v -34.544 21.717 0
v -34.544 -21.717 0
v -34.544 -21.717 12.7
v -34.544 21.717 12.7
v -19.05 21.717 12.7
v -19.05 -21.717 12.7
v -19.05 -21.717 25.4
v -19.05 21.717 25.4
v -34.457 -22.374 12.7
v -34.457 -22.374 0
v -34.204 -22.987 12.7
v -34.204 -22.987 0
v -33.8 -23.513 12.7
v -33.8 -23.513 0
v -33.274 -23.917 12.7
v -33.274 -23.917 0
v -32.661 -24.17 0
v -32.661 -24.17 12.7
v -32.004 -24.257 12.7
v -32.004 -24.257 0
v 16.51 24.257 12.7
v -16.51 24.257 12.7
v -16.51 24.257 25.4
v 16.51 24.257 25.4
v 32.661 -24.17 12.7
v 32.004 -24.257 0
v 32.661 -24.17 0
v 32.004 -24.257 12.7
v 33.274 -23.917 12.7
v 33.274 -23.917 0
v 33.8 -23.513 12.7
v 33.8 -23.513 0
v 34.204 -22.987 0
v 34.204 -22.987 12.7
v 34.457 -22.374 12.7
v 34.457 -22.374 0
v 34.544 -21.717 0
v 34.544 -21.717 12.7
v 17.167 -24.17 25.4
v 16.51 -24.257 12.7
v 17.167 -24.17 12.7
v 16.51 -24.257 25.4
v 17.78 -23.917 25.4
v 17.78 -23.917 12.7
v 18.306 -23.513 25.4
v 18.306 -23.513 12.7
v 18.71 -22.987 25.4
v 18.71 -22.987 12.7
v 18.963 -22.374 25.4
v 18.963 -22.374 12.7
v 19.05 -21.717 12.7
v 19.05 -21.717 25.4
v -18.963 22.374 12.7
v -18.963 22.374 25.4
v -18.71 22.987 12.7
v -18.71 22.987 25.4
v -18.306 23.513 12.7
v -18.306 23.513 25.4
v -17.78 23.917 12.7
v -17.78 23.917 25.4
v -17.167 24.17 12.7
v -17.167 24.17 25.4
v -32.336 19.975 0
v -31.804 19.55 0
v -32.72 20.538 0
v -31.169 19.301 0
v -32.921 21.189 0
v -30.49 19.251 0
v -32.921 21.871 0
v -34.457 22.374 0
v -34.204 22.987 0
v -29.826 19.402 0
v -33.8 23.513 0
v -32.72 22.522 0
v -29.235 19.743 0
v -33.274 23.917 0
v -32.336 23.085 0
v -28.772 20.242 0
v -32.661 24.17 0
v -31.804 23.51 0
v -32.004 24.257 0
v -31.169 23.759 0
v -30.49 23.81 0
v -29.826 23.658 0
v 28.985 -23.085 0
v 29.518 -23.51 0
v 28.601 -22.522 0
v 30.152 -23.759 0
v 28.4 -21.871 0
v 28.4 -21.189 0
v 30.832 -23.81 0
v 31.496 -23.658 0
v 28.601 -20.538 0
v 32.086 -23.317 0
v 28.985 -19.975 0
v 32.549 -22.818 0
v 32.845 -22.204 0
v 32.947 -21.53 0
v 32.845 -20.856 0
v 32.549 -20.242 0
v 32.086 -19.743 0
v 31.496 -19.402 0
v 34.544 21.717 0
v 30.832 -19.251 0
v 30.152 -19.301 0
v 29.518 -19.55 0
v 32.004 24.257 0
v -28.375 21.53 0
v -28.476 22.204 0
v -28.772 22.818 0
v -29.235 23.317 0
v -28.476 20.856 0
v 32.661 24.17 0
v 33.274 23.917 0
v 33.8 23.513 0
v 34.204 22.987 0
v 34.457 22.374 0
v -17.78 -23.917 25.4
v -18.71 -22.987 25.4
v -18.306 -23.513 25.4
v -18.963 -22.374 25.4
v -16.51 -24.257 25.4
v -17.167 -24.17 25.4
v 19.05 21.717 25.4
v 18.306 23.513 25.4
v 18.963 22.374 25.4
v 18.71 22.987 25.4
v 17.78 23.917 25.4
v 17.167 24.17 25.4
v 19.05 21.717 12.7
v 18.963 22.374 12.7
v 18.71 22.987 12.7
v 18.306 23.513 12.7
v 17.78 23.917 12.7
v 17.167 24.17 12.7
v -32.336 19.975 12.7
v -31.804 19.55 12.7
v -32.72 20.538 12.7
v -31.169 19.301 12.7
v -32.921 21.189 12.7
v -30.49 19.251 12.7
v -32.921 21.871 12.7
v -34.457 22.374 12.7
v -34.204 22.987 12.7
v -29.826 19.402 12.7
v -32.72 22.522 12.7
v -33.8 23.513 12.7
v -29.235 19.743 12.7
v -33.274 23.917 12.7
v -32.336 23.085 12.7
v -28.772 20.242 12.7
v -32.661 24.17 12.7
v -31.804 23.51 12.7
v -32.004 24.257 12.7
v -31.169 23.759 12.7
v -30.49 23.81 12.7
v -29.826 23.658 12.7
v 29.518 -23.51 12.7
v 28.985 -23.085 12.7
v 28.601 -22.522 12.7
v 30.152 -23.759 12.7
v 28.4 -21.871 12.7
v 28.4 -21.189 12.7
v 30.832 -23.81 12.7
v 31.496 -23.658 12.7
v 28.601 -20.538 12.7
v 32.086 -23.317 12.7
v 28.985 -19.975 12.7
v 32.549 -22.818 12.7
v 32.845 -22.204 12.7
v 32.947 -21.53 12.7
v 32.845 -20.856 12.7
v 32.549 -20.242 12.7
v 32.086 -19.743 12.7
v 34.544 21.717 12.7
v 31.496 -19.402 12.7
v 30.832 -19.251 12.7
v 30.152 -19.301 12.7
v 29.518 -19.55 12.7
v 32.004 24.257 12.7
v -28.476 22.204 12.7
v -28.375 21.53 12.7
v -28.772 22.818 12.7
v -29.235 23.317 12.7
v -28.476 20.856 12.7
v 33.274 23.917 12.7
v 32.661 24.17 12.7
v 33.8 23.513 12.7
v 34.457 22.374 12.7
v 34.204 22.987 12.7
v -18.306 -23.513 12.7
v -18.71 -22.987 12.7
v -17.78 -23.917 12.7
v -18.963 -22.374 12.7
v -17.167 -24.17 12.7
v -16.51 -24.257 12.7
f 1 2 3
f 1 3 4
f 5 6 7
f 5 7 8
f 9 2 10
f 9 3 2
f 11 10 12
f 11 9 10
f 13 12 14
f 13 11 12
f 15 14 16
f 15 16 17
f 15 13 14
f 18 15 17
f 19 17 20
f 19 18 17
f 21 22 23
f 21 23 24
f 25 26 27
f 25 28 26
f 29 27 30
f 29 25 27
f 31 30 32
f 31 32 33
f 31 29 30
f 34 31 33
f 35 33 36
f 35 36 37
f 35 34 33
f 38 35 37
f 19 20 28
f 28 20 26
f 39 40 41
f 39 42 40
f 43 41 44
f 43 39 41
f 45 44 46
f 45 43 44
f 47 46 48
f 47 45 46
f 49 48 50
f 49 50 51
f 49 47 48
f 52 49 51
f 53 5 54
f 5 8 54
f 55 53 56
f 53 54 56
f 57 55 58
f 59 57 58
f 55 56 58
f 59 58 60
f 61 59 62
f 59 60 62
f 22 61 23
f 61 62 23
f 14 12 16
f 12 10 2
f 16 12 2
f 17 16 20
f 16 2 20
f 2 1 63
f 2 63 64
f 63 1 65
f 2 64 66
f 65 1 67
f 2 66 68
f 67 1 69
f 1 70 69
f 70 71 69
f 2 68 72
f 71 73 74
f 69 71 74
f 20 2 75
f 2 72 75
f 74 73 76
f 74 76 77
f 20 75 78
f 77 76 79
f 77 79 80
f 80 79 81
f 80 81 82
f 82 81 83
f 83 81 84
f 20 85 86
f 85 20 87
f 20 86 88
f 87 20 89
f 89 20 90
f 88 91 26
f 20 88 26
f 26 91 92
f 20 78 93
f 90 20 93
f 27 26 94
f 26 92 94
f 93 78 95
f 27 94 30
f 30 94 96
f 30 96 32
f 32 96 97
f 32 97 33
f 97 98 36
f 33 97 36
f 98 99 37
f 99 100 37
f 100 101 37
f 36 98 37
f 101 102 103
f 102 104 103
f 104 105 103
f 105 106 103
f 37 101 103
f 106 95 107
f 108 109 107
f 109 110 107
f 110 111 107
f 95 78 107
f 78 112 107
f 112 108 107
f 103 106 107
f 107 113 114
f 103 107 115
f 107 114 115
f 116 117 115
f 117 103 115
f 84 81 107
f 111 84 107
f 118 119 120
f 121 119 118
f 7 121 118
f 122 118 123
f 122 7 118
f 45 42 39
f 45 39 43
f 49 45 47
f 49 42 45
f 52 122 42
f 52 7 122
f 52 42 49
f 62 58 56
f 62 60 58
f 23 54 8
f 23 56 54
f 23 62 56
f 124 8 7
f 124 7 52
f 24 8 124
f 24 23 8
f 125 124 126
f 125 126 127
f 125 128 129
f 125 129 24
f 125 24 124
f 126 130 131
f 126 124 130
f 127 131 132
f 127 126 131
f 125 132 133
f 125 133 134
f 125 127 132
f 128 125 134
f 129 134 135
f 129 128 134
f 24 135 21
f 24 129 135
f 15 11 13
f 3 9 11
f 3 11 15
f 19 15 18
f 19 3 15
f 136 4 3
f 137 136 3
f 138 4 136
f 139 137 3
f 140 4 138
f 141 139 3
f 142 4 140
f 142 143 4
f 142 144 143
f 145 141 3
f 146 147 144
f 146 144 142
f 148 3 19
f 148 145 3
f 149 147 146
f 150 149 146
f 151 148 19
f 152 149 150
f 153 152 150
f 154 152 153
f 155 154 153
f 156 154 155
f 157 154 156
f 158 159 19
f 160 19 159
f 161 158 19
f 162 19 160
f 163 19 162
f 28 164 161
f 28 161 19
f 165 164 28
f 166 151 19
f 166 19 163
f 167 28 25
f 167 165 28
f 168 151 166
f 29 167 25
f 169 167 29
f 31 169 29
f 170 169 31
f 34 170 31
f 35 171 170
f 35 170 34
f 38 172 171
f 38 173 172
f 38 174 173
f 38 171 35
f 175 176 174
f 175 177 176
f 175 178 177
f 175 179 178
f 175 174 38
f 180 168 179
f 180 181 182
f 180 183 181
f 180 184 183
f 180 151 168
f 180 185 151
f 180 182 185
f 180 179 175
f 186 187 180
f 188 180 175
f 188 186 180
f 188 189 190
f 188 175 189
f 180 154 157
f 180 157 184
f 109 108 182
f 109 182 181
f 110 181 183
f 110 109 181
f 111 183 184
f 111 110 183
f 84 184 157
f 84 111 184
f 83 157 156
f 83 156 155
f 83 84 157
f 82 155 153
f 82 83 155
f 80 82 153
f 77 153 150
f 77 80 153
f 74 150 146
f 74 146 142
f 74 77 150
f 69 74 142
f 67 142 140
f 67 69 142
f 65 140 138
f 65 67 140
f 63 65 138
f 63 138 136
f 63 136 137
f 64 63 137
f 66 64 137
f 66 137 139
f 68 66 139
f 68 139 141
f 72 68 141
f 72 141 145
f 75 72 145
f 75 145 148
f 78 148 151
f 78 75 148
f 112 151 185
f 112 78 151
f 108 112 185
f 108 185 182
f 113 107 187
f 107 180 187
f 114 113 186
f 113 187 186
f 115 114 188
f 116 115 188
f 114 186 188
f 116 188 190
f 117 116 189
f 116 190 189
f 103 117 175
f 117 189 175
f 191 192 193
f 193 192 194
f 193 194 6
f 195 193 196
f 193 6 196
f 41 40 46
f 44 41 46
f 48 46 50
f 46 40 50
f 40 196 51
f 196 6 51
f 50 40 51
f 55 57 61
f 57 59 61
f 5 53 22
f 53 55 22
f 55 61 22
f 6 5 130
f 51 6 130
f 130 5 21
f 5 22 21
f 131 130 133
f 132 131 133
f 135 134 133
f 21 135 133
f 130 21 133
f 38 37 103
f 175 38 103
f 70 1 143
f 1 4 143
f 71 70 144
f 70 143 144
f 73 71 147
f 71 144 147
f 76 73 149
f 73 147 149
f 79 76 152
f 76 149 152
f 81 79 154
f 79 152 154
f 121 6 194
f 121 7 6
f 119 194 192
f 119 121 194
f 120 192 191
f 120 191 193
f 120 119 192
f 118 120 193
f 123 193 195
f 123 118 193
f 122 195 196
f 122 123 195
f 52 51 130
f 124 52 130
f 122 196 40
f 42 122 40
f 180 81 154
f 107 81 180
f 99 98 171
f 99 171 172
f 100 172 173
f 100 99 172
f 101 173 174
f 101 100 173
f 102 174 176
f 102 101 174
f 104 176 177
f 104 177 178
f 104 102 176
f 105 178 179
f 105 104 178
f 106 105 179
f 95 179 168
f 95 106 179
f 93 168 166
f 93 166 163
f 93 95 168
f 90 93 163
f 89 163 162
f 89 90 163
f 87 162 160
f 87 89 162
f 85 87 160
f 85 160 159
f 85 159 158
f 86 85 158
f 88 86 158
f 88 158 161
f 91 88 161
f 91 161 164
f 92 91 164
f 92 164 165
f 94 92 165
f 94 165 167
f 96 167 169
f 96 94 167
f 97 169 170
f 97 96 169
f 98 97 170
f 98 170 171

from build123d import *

# Parameters (mm, degrees)
SKETCH1_W           = 69.088
SKETCH1_H           = 48.514
SKETCH1_R           = 2.286
BOSS_EXTRUDE1_DEPTH = 12.7
SKETCH2_W           = 38.1
SKETCH2_H           = 48.514
BOSS_EXTRUDE2_DEPTH = 12.7
FILLET1_R           = 2.54
FILLET2_R           = 2.54


with BuildPart() as part:
    # Sketch1 → Boss-Extrude1 (new body)
    with BuildSketch(Plane.XY):
        Rectangle(SKETCH1_W, SKETCH1_H)
        with Locations((-30.660716006, 21.530135137)):
            Circle(SKETCH1_R, mode=Mode.SUBTRACT)
        with Locations((30.660716006, -21.530135137)):
            Circle(SKETCH1_R, mode=Mode.SUBTRACT)
    extrude(amount=BOSS_EXTRUDE1_DEPTH)

    # Fillet1
    fillet1_edges = [part.edges().sort_by_distance(p)[0] for p in [
        (34.544, -24.257, 6.35),
        (-34.544, -24.257, 6.35),
        (-34.544, 24.257, 6.35),
        (34.544, 24.257, 6.35),
    ]]
    fillet(fillet1_edges, radius=FILLET1_R)


with BuildPart() as body_2:
    # Sketch2 → Boss-Extrude2 (new body)
    with BuildSketch(Plane.XY.offset(12.7)):
        Rectangle(SKETCH2_W, SKETCH2_H)
    extrude(amount=BOSS_EXTRUDE2_DEPTH)

    # Fillet2
    fillet2_edges = [body_2.edges().sort_by_distance(p)[0] for p in [
        (19.05, -24.257, 19.05),
        (-19.05, -24.257, 19.05),
        (-19.05, 24.257, 19.05),
        (19.05, 24.257, 19.05),
    ]]
    fillet(fillet2_edges, radius=FILLET2_R)


solid = Compound([part.part, body_2.part])
